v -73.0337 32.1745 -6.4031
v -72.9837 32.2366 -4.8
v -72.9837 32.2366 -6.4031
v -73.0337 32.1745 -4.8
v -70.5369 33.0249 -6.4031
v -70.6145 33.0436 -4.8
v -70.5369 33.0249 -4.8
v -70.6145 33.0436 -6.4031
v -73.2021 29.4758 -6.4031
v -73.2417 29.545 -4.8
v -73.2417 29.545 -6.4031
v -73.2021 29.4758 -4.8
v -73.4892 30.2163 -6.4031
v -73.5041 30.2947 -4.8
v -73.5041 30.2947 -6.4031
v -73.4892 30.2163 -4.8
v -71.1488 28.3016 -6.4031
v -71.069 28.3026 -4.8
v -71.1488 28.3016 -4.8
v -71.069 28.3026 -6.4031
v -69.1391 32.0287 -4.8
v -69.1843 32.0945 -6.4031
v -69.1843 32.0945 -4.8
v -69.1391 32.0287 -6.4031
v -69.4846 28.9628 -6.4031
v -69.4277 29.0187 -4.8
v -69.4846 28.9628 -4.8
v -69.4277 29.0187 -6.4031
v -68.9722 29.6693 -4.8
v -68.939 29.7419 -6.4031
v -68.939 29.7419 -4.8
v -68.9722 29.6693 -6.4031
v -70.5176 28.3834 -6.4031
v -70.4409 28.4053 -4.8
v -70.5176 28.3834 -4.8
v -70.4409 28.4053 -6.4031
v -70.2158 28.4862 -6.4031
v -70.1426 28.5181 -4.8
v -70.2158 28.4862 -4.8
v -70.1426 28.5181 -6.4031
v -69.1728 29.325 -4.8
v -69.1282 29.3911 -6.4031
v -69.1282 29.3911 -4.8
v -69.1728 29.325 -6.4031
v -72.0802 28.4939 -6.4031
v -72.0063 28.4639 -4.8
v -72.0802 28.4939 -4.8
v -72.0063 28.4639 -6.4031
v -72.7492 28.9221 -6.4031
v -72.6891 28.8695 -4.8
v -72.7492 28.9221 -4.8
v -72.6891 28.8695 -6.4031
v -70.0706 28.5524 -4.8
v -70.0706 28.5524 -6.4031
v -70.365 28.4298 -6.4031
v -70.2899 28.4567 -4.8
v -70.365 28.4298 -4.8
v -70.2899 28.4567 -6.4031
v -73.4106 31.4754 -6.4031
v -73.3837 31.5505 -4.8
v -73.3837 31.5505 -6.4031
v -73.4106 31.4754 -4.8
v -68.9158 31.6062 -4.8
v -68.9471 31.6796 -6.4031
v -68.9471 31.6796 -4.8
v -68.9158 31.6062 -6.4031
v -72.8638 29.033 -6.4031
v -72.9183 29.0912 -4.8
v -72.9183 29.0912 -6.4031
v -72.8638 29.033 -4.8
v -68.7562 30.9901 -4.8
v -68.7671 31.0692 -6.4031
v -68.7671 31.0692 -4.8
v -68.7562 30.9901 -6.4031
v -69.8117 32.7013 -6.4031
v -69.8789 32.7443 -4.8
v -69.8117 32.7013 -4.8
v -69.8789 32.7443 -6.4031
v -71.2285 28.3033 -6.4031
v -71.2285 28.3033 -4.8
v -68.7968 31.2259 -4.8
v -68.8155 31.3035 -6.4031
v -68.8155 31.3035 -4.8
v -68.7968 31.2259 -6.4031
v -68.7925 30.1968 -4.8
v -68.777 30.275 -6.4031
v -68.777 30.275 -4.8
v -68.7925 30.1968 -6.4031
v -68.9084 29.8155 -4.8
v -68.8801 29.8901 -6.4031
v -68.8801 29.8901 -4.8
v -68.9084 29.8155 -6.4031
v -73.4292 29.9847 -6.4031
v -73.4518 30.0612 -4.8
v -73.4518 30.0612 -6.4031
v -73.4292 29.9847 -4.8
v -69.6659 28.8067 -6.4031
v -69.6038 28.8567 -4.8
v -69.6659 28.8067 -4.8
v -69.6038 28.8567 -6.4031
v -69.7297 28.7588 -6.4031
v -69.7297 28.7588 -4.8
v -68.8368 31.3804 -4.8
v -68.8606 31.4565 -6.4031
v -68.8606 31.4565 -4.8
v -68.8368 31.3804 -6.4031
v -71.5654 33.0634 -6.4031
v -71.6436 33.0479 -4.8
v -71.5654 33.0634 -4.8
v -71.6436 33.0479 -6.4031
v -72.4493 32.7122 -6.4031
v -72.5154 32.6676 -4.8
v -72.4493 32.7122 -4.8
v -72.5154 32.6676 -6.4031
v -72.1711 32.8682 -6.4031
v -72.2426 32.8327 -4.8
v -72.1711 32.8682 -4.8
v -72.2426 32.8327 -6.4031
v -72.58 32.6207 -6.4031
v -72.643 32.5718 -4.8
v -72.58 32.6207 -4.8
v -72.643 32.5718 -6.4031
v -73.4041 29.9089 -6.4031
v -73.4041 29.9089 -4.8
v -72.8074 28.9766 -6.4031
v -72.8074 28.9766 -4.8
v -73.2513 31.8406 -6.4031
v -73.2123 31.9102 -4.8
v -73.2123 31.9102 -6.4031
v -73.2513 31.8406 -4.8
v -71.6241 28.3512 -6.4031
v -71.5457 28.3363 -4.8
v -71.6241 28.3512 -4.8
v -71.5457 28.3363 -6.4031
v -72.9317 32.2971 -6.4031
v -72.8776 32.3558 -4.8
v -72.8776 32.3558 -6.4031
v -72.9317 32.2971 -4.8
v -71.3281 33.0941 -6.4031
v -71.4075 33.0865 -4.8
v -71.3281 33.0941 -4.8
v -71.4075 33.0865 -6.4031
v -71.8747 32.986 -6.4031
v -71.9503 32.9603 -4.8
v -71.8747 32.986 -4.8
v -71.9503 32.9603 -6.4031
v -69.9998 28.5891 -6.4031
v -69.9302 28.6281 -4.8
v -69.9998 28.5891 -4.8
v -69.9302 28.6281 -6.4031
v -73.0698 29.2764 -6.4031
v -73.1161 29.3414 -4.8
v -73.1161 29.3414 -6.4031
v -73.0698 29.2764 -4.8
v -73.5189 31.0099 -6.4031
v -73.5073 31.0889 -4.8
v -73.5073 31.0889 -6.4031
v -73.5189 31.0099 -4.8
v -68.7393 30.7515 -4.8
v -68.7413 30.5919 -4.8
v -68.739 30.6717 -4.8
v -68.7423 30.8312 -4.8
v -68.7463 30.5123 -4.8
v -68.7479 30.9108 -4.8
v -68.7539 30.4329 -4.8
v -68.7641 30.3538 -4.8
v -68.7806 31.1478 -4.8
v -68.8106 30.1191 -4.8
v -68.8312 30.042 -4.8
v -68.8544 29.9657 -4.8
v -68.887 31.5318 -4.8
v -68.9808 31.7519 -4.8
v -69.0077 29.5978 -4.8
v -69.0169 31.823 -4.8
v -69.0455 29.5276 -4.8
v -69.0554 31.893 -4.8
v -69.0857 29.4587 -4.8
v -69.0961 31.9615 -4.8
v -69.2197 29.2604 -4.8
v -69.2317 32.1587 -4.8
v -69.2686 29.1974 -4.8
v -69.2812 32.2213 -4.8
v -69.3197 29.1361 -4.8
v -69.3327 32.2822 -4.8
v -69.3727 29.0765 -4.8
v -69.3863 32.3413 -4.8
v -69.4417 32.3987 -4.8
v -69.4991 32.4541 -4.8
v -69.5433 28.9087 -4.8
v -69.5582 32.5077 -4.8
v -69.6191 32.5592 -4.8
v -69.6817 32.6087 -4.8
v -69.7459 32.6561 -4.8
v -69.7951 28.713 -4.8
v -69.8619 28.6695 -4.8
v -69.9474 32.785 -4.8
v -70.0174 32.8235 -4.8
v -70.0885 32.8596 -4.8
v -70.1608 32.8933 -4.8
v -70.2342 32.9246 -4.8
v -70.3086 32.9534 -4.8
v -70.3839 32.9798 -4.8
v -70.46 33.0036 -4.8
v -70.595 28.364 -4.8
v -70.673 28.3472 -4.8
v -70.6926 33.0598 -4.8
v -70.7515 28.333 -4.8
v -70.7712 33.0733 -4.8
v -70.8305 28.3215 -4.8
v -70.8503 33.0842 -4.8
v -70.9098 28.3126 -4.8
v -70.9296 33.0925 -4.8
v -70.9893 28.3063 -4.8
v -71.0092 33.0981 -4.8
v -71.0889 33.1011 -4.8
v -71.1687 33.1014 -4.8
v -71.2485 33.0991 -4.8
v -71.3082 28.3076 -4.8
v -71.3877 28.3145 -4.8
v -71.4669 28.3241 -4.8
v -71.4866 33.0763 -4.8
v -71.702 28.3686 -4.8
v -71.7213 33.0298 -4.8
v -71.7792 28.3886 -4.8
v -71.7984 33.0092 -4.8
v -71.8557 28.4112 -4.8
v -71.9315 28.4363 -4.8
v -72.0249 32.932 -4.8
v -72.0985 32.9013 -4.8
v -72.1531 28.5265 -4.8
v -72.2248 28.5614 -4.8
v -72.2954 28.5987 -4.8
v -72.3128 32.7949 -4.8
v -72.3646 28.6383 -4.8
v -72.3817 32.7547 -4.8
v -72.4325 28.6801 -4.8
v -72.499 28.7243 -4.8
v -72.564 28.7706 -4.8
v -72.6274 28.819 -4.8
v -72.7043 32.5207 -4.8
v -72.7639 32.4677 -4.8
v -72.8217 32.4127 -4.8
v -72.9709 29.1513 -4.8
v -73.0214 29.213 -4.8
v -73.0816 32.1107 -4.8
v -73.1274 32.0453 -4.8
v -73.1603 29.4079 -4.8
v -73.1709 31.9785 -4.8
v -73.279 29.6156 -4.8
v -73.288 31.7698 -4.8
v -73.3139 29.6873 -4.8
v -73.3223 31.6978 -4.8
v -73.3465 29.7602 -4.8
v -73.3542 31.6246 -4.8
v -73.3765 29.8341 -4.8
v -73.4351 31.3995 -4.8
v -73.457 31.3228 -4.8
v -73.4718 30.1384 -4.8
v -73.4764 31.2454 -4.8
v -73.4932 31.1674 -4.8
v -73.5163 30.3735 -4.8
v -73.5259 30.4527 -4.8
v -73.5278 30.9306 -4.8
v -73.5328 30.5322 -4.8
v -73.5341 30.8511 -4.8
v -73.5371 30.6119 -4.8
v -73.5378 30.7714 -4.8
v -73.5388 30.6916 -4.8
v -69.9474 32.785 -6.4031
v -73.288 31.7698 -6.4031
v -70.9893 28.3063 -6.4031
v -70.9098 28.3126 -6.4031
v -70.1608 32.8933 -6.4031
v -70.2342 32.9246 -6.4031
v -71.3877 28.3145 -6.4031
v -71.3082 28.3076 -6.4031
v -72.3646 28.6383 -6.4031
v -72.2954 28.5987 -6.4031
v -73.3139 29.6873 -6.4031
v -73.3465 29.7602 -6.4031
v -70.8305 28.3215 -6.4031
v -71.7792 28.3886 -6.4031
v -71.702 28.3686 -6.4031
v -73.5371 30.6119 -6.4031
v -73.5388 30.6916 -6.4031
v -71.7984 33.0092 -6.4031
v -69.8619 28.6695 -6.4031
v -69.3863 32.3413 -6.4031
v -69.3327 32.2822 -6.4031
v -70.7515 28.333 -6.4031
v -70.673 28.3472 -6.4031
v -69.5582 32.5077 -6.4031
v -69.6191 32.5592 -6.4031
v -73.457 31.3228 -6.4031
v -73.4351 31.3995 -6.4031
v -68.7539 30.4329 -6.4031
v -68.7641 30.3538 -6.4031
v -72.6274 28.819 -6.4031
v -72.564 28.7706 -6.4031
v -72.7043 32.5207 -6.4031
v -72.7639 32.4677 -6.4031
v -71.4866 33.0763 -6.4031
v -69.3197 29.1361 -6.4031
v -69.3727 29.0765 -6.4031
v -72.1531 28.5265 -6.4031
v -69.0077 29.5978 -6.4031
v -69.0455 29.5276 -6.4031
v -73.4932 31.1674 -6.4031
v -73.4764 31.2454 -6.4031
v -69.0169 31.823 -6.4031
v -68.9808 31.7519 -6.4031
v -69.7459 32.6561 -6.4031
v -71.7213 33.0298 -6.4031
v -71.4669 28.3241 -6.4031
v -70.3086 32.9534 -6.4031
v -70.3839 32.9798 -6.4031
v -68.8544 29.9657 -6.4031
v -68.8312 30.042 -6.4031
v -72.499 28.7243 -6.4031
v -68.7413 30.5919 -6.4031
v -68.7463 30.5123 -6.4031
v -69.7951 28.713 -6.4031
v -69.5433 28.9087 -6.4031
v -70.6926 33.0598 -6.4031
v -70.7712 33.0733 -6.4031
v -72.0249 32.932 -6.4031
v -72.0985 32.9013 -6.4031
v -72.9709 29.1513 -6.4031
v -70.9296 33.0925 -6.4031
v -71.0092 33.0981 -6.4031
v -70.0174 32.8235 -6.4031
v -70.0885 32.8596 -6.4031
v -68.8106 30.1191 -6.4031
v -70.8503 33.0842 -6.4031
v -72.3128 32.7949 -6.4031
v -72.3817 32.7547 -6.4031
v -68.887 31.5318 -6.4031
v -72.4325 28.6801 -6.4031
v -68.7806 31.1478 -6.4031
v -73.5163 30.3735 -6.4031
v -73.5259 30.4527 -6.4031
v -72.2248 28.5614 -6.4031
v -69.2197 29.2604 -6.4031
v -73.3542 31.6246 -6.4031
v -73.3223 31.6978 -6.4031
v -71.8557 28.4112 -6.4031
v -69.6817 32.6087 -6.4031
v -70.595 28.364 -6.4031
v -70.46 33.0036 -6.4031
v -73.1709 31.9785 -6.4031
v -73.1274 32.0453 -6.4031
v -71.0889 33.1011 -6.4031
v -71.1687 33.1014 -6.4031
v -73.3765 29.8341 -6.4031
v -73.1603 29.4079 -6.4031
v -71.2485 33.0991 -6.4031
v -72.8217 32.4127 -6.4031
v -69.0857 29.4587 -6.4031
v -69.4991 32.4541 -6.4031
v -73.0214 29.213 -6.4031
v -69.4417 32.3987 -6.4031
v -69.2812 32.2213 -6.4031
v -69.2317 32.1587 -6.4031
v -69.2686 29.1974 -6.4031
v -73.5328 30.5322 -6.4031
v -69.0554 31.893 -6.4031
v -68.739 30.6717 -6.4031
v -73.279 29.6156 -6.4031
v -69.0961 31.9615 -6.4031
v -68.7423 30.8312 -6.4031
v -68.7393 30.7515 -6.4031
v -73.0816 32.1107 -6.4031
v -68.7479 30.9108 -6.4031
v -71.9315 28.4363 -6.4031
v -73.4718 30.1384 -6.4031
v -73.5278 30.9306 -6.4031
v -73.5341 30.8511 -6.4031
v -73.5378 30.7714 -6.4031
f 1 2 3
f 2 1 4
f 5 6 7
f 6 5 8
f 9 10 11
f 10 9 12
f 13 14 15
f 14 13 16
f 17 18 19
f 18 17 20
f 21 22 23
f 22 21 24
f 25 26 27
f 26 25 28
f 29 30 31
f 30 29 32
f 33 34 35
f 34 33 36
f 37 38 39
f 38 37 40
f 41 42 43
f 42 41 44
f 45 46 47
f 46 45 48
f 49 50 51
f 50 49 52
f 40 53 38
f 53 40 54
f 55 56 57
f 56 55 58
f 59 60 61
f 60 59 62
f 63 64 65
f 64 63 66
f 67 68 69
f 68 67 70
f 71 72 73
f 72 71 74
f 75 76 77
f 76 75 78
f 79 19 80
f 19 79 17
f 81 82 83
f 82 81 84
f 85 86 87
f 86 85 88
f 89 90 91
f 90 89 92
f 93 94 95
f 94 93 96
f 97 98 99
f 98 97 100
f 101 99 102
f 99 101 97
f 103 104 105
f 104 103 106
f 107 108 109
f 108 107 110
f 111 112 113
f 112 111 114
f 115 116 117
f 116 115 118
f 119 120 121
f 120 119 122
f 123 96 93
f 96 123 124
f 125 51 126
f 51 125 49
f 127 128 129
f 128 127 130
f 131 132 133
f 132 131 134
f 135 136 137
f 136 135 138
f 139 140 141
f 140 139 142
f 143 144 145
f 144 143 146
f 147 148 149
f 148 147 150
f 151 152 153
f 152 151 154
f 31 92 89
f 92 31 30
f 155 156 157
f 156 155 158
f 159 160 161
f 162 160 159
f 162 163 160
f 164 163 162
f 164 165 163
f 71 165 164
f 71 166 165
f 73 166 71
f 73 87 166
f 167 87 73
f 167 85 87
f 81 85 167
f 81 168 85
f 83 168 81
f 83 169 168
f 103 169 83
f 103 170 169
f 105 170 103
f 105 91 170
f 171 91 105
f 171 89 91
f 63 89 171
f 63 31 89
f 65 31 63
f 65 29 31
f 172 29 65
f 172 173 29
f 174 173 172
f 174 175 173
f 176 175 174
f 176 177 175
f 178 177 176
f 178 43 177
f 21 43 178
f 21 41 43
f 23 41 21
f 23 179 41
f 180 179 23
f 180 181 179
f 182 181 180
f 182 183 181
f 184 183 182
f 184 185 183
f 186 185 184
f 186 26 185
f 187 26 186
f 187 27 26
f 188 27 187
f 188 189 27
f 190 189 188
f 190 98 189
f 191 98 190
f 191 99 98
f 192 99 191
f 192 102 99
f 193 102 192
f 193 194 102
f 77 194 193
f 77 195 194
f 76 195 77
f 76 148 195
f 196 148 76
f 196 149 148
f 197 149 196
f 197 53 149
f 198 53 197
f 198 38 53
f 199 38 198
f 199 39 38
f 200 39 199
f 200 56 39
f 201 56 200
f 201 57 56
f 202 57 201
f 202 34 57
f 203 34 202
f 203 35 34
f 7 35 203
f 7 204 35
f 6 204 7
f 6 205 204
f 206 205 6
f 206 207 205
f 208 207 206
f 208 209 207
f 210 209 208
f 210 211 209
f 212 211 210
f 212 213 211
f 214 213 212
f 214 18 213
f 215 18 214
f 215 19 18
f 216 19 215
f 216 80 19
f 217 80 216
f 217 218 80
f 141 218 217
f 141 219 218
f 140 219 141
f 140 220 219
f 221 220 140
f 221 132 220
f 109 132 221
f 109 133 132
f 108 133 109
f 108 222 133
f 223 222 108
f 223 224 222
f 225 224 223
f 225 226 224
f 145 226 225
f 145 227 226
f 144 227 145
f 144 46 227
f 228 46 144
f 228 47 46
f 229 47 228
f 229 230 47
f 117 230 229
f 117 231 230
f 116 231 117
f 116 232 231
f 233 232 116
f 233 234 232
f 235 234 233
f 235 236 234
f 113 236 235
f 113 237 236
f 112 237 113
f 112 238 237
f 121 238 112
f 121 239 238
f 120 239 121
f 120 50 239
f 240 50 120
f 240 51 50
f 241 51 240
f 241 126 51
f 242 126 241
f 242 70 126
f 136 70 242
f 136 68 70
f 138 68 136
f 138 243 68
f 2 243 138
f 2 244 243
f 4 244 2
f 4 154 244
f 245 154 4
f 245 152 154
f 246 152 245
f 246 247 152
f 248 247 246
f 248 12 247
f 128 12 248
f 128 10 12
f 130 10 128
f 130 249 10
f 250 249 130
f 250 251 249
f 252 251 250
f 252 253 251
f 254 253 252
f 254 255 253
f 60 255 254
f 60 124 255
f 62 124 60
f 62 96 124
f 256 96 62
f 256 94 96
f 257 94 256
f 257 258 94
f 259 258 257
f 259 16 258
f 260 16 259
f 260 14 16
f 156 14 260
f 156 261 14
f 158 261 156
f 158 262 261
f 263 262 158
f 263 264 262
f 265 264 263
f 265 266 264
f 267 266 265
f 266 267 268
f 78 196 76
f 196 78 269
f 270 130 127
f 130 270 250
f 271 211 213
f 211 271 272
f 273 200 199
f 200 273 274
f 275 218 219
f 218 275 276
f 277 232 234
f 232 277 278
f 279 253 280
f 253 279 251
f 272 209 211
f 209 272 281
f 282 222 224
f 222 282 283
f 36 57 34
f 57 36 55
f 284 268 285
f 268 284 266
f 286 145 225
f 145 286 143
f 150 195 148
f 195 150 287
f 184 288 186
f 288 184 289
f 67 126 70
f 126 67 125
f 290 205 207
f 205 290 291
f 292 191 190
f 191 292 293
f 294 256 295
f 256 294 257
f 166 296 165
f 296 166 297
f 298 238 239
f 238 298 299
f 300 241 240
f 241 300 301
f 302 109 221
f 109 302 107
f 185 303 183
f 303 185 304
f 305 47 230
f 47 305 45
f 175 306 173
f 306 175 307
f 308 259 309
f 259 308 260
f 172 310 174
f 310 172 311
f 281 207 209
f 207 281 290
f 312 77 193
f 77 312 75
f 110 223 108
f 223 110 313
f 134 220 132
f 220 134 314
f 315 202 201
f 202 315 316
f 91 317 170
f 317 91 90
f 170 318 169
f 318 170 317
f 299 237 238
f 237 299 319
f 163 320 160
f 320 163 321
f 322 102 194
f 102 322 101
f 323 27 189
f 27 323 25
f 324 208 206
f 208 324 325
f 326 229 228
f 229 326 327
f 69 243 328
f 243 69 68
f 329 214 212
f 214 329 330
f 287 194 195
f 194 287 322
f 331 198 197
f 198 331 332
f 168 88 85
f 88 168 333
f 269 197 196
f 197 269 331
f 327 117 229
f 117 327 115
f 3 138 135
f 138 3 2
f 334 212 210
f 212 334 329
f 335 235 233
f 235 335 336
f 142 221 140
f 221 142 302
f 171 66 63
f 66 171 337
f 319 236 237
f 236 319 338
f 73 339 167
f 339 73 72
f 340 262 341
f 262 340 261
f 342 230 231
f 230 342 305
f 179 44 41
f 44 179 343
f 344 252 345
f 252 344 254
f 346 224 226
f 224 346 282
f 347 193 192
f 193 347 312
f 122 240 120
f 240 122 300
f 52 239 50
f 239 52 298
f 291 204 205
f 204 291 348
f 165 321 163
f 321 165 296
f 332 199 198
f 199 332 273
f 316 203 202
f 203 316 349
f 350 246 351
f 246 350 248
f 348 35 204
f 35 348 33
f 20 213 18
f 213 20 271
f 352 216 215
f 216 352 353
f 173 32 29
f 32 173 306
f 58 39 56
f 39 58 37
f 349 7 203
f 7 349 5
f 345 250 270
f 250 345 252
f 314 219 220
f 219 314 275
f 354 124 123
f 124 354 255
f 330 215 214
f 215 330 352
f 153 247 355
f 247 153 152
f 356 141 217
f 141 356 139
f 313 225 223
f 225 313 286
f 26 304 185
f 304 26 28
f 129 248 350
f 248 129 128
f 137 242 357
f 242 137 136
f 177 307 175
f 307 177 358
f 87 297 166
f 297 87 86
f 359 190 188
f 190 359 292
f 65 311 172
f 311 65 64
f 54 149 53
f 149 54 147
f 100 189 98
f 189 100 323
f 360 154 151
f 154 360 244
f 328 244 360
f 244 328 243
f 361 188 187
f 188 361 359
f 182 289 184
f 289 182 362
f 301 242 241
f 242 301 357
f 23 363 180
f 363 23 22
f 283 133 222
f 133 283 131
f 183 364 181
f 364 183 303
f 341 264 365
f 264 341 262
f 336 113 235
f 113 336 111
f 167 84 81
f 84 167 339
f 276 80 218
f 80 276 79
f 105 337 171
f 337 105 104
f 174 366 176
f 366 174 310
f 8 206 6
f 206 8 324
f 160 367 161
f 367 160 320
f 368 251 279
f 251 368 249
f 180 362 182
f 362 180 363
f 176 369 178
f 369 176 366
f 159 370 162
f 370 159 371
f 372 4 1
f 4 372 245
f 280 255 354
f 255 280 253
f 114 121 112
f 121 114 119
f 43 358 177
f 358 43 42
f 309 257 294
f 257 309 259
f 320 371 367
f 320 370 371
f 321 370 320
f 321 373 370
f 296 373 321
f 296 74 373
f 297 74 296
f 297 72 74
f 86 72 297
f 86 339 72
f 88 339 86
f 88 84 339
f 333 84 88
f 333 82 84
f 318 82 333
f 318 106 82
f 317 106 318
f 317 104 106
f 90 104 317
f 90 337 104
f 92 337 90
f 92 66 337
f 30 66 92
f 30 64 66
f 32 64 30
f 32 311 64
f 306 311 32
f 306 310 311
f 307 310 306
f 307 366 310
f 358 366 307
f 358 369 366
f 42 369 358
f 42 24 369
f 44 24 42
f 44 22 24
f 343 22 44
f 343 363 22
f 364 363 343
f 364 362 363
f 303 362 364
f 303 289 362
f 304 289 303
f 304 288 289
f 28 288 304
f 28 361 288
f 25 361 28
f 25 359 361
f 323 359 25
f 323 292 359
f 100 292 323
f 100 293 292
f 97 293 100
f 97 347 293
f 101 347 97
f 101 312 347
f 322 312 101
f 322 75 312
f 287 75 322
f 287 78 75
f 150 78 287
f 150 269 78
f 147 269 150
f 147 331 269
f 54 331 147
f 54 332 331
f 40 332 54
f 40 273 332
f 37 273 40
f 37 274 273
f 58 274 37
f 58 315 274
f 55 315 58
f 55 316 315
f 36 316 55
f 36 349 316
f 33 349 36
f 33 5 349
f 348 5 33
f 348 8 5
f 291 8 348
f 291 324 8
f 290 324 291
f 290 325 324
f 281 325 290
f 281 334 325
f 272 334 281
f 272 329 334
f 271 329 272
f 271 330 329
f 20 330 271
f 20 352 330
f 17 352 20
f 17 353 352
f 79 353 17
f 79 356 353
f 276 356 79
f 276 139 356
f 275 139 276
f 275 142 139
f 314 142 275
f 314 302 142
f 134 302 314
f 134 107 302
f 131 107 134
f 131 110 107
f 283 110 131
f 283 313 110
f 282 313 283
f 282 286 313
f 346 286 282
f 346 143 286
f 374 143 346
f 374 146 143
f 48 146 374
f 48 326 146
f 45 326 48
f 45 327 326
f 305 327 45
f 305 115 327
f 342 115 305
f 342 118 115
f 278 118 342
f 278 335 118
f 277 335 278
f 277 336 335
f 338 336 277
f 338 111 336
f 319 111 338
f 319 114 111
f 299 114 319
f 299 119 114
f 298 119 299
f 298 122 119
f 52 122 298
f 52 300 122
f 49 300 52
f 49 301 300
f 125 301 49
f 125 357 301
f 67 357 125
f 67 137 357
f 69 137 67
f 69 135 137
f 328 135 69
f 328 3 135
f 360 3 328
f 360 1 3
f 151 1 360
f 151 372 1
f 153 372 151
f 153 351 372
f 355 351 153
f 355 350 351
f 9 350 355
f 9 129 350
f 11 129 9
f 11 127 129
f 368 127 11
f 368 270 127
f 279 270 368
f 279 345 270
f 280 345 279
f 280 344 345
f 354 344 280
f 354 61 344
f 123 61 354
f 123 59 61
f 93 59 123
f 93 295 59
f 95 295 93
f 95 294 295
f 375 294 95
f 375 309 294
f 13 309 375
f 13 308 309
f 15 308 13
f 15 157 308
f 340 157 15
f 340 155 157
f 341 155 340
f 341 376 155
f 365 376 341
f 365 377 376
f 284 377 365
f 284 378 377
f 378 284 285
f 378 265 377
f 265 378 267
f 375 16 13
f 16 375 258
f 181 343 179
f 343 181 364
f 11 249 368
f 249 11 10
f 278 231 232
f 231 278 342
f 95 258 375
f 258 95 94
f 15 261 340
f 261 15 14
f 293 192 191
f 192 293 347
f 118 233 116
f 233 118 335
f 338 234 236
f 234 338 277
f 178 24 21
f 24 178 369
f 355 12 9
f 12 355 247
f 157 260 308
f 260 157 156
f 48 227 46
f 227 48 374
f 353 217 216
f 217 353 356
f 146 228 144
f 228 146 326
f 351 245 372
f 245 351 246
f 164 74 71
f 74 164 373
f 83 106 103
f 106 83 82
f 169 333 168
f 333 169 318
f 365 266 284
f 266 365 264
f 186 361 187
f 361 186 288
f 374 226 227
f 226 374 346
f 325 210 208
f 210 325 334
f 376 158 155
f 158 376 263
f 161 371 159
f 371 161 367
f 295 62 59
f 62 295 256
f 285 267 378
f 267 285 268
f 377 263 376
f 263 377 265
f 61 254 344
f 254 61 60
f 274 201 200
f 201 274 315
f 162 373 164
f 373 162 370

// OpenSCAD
use <../lib.scad>
use <s/950as01.scad>
use <../p/stud.scad>
$fa=1; $fs=0.2;
function ldraw_lib__950a(realsolid=false) = [
// 0 ~Train Track  4.5V Point Type 1 Left - Switch Rails
// 0 Name: 950a.dat
// 0 Author: Alex Taylor [anathema]
// 0 !LDRAW_ORG Part UPDATE 2010-03
// 0 !LICENSE Licensed under CC BY 2.0 and CC BY 4.0 : see CAreadme.txt
// 
// 0 BFC CERTIFY CCW
  [0,"BFC","CERTIFY"],
  [0,"BFC","CCW"],
// 
// 0 !HISTORY 2010-12-31 [PTadmin] Official Update 2010-03
// 
// 
// 1 16 -177.847 16 76.754 0.965926 0 -0.258819 0 1 0 0.258819 0 0.965926 stud.dat
  [1,16,-177.847,16,76.754,0.965926,0,-0.258819,0,1,0,0.258819,0,0.965926, ldraw_lib__stud(realsolid)],
// 1 16 0 0 0 1 0 0 0 1 0 0 0 1 s\950as01.dat
  [1,16,0,0,0,1,0,0,0,1,0,0,0,1, ldraw_lib__s__950as01(realsolid)],
// 0
];
module ldraw_lib__950a(step=0, col=false, unit=2/5, alt=false, line=0.2, solid=!$preview)
    makepoly(ldraw_lib__950a(solid), step=step, col=col, unit=unit, alt=alt, line=line, solid=solid);
ldraw_lib__950a(line=0.2);
